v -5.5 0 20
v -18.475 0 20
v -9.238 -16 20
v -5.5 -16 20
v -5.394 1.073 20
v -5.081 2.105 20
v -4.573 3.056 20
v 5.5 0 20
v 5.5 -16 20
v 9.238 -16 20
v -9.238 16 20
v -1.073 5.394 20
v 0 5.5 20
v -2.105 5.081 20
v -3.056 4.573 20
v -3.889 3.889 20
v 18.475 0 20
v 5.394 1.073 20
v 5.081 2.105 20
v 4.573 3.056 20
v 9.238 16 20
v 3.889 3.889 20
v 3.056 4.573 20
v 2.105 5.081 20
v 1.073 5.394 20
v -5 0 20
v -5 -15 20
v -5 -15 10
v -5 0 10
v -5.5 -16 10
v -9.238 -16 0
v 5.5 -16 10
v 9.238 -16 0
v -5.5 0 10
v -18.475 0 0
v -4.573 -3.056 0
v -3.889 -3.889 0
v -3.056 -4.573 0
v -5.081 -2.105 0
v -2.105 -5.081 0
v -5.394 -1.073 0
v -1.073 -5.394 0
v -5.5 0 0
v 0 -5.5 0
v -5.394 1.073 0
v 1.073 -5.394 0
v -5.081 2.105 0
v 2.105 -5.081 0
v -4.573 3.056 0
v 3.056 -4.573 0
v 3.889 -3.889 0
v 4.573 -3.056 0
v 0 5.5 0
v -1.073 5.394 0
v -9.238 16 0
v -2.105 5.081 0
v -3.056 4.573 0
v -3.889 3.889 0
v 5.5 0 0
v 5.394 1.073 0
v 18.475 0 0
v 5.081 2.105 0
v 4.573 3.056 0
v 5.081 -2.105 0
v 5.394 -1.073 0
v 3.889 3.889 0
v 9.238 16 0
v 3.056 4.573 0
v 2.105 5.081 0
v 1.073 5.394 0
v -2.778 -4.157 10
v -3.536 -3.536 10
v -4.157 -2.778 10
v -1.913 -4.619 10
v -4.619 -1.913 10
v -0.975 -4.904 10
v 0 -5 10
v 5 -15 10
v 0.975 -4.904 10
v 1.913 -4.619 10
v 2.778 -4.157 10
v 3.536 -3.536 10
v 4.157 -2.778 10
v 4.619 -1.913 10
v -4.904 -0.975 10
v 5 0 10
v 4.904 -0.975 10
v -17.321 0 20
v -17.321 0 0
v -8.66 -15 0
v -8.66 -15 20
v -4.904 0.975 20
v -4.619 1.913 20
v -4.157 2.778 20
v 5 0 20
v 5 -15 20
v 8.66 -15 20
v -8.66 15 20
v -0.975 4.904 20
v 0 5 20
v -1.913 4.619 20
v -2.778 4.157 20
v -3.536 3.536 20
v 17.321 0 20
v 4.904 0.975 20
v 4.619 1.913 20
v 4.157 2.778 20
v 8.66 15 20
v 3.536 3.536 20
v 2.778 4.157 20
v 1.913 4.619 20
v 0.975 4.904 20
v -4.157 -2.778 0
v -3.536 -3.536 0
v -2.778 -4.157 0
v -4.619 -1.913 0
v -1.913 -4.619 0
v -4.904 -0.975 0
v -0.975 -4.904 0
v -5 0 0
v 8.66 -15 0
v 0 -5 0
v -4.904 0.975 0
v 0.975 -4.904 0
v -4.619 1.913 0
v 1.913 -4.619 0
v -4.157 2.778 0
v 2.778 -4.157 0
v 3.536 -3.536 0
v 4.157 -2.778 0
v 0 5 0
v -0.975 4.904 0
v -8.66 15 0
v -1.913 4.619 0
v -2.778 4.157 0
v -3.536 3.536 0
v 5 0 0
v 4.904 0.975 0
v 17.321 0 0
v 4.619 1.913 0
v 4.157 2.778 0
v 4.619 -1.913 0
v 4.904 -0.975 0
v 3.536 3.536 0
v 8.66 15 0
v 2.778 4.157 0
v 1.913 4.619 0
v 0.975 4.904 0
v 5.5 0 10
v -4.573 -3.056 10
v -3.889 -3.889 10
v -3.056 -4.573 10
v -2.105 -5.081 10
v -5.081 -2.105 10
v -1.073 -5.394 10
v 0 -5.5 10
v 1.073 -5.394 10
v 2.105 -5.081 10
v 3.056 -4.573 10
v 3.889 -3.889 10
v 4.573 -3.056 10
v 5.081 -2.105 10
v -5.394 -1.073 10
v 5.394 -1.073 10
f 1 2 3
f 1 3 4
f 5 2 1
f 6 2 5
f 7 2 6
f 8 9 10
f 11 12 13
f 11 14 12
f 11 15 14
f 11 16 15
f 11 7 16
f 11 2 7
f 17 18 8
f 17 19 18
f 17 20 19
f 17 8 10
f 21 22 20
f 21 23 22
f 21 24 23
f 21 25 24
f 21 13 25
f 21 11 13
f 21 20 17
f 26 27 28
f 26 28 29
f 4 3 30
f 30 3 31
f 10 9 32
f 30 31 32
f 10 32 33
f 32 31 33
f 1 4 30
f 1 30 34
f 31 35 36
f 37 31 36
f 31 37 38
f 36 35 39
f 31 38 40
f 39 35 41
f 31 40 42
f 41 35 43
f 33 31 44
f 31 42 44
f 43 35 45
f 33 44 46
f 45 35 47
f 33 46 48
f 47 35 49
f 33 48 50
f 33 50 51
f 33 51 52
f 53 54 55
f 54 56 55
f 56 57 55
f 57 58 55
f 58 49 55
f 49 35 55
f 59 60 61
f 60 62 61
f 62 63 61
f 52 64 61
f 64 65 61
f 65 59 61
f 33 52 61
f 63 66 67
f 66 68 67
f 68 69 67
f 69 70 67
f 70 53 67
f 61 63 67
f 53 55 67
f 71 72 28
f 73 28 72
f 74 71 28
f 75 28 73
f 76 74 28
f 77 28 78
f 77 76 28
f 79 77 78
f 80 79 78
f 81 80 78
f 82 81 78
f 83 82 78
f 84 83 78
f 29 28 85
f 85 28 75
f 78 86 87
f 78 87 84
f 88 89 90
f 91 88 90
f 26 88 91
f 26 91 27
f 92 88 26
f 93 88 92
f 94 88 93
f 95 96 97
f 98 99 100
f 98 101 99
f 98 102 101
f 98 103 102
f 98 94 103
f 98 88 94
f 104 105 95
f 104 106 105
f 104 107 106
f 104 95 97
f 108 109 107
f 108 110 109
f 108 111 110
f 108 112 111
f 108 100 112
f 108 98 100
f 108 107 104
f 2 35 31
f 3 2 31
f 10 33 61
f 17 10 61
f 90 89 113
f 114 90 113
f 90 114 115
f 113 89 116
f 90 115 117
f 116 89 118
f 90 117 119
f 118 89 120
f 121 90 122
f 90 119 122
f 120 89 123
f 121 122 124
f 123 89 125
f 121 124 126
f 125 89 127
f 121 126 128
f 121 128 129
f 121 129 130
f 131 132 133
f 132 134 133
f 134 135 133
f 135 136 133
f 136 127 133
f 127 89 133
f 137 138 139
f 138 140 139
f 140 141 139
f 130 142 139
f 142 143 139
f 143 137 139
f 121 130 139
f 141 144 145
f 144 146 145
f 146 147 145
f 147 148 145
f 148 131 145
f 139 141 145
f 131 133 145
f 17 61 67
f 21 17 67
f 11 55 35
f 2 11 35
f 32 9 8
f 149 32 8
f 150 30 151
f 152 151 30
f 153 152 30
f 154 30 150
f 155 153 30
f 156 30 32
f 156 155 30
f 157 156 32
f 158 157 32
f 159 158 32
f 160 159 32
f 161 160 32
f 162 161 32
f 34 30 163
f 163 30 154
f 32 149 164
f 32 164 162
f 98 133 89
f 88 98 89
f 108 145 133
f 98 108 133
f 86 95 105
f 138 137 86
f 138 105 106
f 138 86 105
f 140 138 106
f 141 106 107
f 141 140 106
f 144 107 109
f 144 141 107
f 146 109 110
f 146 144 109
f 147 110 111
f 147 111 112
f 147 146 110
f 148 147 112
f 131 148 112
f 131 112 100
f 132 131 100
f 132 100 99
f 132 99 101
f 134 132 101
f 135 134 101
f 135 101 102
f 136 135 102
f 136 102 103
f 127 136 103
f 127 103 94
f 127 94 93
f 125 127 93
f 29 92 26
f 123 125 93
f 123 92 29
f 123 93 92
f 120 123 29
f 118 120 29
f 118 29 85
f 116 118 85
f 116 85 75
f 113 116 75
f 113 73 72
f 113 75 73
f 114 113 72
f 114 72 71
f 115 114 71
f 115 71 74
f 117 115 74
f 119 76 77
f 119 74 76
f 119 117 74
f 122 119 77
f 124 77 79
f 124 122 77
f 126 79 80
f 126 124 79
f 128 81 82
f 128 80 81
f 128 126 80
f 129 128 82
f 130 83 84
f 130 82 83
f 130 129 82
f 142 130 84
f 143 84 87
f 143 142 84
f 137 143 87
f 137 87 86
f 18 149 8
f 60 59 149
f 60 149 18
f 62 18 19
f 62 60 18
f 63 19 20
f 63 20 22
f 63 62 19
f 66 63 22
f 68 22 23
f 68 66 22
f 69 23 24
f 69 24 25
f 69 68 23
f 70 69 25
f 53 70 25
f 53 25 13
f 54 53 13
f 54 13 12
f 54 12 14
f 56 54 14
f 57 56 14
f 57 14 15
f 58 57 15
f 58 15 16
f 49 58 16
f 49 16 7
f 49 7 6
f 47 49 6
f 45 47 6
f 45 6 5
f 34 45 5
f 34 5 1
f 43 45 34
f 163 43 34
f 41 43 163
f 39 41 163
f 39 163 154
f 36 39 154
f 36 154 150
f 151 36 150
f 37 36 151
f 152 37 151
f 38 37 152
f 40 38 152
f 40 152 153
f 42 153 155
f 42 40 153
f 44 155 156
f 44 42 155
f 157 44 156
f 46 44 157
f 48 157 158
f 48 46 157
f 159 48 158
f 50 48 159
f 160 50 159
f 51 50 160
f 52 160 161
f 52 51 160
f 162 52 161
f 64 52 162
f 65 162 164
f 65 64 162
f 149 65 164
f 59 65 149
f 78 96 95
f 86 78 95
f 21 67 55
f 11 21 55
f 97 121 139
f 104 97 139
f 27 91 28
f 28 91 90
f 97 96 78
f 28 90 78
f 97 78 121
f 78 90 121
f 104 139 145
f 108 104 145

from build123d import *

# Parameters (mm, degrees)
SKETCH_R        = 5
PAD_DEPTH       = 20
SKETCH001_W     = 10
SKETCH001_H     = 20
POCKET_DEPTH    = 10
SKETCH002_R     = 5.5
PAD001_DEPTH    = 20
SKETCH003_W     = 11
SKETCH003_H     = 20
POCKET001_DEPTH = 10


with BuildPart() as body30mm:
    # Sketch → Pad (new body)
    with BuildSketch(Plane.XY):
        Polygon((17.320508, 0), (8.660254, 15), (-8.660254, 15), (-17.320508, 0), (-8.660254, -15), (8.660254, -15), align=None)
        Circle(SKETCH_R, mode=Mode.SUBTRACT)
    extrude(amount=PAD_DEPTH)

    # Sketch001 (on Face9 of Pad) → Pocket (cut)
    with BuildSketch(Plane.XY.offset(20)):
        with Locations((0, -10)):
            Rectangle(SKETCH001_W, SKETCH001_H)
    extrude(amount=-POCKET_DEPTH, mode=Mode.SUBTRACT)


with BuildPart() as body32mm:
    # Sketch002 → Pad001 (new body)
    with BuildSketch(Plane.XY):
        Polygon((18.475209, 0), (9.237604, 16), (-9.237604, 16), (-18.475209, 0), (-9.237604, -16), (9.237604, -16), align=None)
        Circle(SKETCH002_R, mode=Mode.SUBTRACT)
    extrude(amount=PAD001_DEPTH)

    # Sketch003 (on Face9 of Pad001) → Pocket001 (cut)
    with BuildSketch(Plane.XY.offset(20)):
        with Locations((0, -10)):
            Rectangle(SKETCH003_W, SKETCH003_H)
    extrude(amount=-POCKET001_DEPTH, mode=Mode.SUBTRACT)


solid = Compound([body30mm.part, body32mm.part])
